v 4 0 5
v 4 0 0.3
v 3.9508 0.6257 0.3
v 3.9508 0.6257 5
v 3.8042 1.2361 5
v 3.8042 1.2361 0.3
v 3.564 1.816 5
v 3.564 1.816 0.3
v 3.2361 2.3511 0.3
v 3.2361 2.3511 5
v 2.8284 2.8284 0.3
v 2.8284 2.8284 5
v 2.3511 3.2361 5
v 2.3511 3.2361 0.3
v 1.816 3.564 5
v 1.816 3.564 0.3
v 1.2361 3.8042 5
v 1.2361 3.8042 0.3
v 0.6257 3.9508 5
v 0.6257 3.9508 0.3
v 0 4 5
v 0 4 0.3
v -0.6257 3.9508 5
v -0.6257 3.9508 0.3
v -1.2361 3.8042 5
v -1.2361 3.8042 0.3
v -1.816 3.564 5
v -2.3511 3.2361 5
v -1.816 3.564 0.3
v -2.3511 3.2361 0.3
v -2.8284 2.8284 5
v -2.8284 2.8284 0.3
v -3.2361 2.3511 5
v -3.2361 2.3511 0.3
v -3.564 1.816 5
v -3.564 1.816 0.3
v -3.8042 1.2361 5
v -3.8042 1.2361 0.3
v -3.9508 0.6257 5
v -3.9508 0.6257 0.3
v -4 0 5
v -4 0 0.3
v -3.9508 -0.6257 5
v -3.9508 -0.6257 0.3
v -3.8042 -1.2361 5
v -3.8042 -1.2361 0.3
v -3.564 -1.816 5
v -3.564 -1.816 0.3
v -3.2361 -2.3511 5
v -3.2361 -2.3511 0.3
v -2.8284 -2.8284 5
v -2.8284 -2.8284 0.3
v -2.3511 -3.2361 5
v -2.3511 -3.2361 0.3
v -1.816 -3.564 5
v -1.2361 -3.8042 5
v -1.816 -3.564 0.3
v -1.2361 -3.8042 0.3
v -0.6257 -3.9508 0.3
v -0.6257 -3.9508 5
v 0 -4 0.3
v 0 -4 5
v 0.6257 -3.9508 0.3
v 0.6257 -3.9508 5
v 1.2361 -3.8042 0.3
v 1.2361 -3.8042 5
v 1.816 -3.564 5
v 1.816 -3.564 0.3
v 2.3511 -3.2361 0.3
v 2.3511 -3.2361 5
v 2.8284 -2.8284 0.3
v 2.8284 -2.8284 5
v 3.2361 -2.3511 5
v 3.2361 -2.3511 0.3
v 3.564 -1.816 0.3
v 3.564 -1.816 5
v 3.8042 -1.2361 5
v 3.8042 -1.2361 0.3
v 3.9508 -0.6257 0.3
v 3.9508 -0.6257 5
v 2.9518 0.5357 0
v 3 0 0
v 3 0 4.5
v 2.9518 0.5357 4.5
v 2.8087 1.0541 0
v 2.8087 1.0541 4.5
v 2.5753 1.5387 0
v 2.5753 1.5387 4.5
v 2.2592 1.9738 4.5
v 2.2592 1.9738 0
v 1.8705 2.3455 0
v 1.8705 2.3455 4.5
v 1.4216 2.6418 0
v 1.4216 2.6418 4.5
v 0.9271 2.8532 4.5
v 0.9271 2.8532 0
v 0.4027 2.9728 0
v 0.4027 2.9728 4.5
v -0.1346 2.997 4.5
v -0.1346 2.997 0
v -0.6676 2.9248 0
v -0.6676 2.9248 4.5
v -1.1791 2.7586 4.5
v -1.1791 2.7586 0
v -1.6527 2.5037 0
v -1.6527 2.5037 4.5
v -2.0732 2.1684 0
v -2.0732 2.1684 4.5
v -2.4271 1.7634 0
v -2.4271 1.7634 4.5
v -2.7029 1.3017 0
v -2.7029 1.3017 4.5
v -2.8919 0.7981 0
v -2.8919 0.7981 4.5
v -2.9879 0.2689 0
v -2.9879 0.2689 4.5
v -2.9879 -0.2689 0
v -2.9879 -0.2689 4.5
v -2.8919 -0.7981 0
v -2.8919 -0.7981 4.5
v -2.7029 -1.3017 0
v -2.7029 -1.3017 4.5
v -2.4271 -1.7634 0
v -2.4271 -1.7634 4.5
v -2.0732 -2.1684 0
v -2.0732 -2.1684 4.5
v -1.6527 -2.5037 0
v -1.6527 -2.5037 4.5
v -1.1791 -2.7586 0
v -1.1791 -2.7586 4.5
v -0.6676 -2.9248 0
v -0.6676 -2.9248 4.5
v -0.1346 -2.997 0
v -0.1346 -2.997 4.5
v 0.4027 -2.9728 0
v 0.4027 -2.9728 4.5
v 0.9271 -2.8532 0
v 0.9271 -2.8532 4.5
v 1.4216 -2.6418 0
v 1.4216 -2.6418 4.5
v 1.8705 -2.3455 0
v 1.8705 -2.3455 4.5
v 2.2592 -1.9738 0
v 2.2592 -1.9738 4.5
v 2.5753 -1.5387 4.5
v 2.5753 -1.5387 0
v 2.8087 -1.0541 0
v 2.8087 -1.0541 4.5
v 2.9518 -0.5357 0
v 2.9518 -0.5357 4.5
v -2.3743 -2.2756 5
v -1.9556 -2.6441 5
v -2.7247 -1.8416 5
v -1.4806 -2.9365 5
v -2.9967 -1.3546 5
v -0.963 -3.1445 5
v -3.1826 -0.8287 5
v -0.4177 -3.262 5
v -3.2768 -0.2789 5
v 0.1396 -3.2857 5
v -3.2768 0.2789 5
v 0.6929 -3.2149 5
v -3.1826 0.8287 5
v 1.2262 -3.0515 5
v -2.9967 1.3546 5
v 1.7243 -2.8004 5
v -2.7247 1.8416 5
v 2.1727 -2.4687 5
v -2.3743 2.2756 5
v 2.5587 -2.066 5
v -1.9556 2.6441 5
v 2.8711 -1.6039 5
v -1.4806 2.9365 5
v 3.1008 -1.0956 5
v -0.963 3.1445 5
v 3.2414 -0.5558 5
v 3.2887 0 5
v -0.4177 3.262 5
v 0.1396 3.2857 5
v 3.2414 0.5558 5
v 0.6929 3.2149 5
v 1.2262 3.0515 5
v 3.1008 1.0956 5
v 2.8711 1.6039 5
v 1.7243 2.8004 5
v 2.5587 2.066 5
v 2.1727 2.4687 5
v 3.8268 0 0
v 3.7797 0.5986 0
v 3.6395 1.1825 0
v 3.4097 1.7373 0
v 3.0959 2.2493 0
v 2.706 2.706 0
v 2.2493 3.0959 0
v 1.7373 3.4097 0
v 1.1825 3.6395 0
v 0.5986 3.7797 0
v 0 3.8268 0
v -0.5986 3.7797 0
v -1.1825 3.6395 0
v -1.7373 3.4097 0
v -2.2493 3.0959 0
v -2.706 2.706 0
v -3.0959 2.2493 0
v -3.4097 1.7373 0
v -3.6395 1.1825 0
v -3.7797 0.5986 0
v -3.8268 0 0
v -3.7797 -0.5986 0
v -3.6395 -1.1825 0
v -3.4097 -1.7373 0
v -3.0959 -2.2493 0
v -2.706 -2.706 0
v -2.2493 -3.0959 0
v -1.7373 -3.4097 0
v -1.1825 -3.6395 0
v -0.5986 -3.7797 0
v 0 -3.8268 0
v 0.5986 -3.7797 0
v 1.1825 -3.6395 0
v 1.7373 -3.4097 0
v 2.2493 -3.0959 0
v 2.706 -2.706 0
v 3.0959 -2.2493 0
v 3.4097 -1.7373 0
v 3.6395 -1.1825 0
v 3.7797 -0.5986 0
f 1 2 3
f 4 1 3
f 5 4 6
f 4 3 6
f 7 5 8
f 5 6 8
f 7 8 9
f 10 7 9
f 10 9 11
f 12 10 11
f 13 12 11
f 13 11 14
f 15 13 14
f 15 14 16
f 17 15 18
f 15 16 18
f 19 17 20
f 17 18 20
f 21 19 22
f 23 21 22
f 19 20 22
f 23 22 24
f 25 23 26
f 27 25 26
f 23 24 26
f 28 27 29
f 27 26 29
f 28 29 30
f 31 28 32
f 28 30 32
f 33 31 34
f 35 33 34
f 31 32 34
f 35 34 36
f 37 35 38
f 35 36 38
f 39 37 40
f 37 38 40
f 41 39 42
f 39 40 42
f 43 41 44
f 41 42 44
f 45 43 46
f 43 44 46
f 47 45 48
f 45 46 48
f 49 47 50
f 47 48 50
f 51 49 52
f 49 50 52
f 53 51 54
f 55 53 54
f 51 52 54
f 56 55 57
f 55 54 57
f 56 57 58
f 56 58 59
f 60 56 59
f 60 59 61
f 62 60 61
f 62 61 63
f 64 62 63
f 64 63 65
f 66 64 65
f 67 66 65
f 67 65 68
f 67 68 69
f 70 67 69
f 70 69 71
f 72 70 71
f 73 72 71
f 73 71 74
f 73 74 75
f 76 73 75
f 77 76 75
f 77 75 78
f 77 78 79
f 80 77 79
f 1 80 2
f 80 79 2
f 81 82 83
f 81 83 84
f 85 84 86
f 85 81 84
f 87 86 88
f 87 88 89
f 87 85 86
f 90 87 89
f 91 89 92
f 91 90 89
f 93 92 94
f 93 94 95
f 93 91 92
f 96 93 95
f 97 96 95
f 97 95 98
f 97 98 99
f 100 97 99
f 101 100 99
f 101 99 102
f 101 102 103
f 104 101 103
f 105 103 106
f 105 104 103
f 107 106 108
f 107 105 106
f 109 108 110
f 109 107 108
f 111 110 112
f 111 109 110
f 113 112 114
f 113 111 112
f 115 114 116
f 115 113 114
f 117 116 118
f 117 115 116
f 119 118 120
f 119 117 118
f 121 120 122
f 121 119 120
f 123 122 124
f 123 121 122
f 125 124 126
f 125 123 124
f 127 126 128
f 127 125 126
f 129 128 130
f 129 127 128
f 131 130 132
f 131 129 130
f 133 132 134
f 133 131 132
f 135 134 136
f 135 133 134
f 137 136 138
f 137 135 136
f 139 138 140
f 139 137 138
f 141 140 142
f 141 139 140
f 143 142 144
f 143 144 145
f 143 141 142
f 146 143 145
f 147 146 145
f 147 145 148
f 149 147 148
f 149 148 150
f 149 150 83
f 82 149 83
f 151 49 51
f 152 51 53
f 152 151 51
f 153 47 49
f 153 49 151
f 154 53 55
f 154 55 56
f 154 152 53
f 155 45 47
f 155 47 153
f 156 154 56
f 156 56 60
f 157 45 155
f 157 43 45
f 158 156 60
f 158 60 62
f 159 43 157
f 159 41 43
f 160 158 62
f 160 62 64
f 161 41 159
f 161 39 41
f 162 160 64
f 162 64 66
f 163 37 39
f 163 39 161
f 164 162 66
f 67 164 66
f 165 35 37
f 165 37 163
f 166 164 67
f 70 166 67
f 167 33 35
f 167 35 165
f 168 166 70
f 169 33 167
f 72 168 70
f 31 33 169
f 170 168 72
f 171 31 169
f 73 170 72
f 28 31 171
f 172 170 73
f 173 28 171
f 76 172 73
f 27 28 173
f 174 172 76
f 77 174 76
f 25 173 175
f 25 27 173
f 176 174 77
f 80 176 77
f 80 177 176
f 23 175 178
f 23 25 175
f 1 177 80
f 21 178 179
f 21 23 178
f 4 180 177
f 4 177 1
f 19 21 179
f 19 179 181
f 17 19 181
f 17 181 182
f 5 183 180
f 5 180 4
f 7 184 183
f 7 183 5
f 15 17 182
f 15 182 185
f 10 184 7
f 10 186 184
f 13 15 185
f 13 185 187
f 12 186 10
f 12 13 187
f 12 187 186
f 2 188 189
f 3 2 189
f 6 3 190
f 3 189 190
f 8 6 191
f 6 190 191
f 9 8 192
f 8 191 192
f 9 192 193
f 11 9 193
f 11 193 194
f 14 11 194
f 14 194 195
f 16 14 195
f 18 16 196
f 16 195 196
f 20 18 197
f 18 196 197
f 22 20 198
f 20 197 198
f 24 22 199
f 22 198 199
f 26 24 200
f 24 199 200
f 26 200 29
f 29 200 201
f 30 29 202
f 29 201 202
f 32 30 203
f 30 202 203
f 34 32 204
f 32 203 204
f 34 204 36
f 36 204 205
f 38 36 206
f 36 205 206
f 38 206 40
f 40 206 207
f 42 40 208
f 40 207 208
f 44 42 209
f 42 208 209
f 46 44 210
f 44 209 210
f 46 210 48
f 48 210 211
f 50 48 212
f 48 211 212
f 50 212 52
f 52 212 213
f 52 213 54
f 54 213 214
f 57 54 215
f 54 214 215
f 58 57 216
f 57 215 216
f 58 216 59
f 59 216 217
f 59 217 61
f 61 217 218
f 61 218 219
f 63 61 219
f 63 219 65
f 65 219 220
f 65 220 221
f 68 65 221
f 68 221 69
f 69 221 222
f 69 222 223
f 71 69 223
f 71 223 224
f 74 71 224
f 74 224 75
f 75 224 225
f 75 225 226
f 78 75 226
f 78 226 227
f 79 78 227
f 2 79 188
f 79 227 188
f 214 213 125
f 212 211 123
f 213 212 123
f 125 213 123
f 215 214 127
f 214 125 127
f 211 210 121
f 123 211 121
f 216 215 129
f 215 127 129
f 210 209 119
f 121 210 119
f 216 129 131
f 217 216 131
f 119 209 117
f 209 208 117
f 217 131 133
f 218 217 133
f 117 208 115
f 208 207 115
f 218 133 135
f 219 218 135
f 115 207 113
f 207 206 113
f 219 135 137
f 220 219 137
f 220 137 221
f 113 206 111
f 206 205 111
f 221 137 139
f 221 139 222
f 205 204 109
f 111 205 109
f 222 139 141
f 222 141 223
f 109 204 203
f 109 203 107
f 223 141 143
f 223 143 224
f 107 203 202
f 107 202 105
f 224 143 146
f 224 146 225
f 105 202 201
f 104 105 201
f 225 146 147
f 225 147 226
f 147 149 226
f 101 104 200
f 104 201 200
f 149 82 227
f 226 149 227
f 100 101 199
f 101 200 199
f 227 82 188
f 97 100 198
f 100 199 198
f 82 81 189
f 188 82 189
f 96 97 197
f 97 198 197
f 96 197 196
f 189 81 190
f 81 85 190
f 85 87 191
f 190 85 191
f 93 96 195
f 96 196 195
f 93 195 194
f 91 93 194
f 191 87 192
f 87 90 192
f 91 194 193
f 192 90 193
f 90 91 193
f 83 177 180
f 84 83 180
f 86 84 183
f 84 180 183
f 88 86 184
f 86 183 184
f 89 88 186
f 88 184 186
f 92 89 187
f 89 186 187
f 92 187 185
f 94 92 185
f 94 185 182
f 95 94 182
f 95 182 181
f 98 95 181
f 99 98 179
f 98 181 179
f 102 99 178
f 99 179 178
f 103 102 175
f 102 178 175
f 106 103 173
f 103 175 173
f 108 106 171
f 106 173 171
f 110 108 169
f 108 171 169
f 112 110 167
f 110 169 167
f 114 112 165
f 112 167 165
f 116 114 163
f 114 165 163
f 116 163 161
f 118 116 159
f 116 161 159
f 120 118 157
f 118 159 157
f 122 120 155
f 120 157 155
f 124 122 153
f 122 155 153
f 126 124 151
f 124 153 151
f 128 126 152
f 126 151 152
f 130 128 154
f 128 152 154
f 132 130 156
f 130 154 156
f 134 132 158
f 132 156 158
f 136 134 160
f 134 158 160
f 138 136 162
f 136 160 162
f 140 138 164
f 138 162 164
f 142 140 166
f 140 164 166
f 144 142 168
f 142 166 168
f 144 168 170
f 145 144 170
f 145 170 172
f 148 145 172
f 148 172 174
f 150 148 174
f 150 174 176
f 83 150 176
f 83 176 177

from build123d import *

# Parameters (mm, degrees)
SKETCH1_R           = 4
SKETCH1_R_2         = 3
BOSS_EXTRUDE1_DEPTH = 5
CHAMFER1_SIZE       = 0.3
CHAMFER1_SIZE2      = 0.173205081
CHAMFER2_SIZE       = 0.5
CHAMFER2_SIZE2      = 0.288675135


with BuildPart() as part:
    # Sketch1 → Boss-Extrude1 (new body)
    with BuildSketch(Plane.XY):
        Circle(SKETCH1_R)
        Circle(SKETCH1_R_2, mode=Mode.SUBTRACT)
    extrude(amount=BOSS_EXTRUDE1_DEPTH)

    # Chamfer1
    chamfer1_edges = [part.edges().sort_by_distance(p)[0] for p in [
        (-4, 0, 0),
    ]]
    chamfer1_side = [part.faces().sort_by_distance(p)[0] for p in [
        (-4, 0, 2.5),
    ]]
    chamfer(chamfer1_edges, length=CHAMFER1_SIZE, length2=CHAMFER1_SIZE2, reference=chamfer1_side[0])

    # Chamfer2
    chamfer2_edges = [part.edges().sort_by_distance(p)[0] for p in [
        (-3, 0, 5),
    ]]
    chamfer2_side = [part.faces().sort_by_distance(p)[0] for p in [
        (-3, 0, 2.5),
    ]]
    chamfer(chamfer2_edges, length=CHAMFER2_SIZE, length2=CHAMFER2_SIZE2, reference=chamfer2_side[0])


solid = part.part
